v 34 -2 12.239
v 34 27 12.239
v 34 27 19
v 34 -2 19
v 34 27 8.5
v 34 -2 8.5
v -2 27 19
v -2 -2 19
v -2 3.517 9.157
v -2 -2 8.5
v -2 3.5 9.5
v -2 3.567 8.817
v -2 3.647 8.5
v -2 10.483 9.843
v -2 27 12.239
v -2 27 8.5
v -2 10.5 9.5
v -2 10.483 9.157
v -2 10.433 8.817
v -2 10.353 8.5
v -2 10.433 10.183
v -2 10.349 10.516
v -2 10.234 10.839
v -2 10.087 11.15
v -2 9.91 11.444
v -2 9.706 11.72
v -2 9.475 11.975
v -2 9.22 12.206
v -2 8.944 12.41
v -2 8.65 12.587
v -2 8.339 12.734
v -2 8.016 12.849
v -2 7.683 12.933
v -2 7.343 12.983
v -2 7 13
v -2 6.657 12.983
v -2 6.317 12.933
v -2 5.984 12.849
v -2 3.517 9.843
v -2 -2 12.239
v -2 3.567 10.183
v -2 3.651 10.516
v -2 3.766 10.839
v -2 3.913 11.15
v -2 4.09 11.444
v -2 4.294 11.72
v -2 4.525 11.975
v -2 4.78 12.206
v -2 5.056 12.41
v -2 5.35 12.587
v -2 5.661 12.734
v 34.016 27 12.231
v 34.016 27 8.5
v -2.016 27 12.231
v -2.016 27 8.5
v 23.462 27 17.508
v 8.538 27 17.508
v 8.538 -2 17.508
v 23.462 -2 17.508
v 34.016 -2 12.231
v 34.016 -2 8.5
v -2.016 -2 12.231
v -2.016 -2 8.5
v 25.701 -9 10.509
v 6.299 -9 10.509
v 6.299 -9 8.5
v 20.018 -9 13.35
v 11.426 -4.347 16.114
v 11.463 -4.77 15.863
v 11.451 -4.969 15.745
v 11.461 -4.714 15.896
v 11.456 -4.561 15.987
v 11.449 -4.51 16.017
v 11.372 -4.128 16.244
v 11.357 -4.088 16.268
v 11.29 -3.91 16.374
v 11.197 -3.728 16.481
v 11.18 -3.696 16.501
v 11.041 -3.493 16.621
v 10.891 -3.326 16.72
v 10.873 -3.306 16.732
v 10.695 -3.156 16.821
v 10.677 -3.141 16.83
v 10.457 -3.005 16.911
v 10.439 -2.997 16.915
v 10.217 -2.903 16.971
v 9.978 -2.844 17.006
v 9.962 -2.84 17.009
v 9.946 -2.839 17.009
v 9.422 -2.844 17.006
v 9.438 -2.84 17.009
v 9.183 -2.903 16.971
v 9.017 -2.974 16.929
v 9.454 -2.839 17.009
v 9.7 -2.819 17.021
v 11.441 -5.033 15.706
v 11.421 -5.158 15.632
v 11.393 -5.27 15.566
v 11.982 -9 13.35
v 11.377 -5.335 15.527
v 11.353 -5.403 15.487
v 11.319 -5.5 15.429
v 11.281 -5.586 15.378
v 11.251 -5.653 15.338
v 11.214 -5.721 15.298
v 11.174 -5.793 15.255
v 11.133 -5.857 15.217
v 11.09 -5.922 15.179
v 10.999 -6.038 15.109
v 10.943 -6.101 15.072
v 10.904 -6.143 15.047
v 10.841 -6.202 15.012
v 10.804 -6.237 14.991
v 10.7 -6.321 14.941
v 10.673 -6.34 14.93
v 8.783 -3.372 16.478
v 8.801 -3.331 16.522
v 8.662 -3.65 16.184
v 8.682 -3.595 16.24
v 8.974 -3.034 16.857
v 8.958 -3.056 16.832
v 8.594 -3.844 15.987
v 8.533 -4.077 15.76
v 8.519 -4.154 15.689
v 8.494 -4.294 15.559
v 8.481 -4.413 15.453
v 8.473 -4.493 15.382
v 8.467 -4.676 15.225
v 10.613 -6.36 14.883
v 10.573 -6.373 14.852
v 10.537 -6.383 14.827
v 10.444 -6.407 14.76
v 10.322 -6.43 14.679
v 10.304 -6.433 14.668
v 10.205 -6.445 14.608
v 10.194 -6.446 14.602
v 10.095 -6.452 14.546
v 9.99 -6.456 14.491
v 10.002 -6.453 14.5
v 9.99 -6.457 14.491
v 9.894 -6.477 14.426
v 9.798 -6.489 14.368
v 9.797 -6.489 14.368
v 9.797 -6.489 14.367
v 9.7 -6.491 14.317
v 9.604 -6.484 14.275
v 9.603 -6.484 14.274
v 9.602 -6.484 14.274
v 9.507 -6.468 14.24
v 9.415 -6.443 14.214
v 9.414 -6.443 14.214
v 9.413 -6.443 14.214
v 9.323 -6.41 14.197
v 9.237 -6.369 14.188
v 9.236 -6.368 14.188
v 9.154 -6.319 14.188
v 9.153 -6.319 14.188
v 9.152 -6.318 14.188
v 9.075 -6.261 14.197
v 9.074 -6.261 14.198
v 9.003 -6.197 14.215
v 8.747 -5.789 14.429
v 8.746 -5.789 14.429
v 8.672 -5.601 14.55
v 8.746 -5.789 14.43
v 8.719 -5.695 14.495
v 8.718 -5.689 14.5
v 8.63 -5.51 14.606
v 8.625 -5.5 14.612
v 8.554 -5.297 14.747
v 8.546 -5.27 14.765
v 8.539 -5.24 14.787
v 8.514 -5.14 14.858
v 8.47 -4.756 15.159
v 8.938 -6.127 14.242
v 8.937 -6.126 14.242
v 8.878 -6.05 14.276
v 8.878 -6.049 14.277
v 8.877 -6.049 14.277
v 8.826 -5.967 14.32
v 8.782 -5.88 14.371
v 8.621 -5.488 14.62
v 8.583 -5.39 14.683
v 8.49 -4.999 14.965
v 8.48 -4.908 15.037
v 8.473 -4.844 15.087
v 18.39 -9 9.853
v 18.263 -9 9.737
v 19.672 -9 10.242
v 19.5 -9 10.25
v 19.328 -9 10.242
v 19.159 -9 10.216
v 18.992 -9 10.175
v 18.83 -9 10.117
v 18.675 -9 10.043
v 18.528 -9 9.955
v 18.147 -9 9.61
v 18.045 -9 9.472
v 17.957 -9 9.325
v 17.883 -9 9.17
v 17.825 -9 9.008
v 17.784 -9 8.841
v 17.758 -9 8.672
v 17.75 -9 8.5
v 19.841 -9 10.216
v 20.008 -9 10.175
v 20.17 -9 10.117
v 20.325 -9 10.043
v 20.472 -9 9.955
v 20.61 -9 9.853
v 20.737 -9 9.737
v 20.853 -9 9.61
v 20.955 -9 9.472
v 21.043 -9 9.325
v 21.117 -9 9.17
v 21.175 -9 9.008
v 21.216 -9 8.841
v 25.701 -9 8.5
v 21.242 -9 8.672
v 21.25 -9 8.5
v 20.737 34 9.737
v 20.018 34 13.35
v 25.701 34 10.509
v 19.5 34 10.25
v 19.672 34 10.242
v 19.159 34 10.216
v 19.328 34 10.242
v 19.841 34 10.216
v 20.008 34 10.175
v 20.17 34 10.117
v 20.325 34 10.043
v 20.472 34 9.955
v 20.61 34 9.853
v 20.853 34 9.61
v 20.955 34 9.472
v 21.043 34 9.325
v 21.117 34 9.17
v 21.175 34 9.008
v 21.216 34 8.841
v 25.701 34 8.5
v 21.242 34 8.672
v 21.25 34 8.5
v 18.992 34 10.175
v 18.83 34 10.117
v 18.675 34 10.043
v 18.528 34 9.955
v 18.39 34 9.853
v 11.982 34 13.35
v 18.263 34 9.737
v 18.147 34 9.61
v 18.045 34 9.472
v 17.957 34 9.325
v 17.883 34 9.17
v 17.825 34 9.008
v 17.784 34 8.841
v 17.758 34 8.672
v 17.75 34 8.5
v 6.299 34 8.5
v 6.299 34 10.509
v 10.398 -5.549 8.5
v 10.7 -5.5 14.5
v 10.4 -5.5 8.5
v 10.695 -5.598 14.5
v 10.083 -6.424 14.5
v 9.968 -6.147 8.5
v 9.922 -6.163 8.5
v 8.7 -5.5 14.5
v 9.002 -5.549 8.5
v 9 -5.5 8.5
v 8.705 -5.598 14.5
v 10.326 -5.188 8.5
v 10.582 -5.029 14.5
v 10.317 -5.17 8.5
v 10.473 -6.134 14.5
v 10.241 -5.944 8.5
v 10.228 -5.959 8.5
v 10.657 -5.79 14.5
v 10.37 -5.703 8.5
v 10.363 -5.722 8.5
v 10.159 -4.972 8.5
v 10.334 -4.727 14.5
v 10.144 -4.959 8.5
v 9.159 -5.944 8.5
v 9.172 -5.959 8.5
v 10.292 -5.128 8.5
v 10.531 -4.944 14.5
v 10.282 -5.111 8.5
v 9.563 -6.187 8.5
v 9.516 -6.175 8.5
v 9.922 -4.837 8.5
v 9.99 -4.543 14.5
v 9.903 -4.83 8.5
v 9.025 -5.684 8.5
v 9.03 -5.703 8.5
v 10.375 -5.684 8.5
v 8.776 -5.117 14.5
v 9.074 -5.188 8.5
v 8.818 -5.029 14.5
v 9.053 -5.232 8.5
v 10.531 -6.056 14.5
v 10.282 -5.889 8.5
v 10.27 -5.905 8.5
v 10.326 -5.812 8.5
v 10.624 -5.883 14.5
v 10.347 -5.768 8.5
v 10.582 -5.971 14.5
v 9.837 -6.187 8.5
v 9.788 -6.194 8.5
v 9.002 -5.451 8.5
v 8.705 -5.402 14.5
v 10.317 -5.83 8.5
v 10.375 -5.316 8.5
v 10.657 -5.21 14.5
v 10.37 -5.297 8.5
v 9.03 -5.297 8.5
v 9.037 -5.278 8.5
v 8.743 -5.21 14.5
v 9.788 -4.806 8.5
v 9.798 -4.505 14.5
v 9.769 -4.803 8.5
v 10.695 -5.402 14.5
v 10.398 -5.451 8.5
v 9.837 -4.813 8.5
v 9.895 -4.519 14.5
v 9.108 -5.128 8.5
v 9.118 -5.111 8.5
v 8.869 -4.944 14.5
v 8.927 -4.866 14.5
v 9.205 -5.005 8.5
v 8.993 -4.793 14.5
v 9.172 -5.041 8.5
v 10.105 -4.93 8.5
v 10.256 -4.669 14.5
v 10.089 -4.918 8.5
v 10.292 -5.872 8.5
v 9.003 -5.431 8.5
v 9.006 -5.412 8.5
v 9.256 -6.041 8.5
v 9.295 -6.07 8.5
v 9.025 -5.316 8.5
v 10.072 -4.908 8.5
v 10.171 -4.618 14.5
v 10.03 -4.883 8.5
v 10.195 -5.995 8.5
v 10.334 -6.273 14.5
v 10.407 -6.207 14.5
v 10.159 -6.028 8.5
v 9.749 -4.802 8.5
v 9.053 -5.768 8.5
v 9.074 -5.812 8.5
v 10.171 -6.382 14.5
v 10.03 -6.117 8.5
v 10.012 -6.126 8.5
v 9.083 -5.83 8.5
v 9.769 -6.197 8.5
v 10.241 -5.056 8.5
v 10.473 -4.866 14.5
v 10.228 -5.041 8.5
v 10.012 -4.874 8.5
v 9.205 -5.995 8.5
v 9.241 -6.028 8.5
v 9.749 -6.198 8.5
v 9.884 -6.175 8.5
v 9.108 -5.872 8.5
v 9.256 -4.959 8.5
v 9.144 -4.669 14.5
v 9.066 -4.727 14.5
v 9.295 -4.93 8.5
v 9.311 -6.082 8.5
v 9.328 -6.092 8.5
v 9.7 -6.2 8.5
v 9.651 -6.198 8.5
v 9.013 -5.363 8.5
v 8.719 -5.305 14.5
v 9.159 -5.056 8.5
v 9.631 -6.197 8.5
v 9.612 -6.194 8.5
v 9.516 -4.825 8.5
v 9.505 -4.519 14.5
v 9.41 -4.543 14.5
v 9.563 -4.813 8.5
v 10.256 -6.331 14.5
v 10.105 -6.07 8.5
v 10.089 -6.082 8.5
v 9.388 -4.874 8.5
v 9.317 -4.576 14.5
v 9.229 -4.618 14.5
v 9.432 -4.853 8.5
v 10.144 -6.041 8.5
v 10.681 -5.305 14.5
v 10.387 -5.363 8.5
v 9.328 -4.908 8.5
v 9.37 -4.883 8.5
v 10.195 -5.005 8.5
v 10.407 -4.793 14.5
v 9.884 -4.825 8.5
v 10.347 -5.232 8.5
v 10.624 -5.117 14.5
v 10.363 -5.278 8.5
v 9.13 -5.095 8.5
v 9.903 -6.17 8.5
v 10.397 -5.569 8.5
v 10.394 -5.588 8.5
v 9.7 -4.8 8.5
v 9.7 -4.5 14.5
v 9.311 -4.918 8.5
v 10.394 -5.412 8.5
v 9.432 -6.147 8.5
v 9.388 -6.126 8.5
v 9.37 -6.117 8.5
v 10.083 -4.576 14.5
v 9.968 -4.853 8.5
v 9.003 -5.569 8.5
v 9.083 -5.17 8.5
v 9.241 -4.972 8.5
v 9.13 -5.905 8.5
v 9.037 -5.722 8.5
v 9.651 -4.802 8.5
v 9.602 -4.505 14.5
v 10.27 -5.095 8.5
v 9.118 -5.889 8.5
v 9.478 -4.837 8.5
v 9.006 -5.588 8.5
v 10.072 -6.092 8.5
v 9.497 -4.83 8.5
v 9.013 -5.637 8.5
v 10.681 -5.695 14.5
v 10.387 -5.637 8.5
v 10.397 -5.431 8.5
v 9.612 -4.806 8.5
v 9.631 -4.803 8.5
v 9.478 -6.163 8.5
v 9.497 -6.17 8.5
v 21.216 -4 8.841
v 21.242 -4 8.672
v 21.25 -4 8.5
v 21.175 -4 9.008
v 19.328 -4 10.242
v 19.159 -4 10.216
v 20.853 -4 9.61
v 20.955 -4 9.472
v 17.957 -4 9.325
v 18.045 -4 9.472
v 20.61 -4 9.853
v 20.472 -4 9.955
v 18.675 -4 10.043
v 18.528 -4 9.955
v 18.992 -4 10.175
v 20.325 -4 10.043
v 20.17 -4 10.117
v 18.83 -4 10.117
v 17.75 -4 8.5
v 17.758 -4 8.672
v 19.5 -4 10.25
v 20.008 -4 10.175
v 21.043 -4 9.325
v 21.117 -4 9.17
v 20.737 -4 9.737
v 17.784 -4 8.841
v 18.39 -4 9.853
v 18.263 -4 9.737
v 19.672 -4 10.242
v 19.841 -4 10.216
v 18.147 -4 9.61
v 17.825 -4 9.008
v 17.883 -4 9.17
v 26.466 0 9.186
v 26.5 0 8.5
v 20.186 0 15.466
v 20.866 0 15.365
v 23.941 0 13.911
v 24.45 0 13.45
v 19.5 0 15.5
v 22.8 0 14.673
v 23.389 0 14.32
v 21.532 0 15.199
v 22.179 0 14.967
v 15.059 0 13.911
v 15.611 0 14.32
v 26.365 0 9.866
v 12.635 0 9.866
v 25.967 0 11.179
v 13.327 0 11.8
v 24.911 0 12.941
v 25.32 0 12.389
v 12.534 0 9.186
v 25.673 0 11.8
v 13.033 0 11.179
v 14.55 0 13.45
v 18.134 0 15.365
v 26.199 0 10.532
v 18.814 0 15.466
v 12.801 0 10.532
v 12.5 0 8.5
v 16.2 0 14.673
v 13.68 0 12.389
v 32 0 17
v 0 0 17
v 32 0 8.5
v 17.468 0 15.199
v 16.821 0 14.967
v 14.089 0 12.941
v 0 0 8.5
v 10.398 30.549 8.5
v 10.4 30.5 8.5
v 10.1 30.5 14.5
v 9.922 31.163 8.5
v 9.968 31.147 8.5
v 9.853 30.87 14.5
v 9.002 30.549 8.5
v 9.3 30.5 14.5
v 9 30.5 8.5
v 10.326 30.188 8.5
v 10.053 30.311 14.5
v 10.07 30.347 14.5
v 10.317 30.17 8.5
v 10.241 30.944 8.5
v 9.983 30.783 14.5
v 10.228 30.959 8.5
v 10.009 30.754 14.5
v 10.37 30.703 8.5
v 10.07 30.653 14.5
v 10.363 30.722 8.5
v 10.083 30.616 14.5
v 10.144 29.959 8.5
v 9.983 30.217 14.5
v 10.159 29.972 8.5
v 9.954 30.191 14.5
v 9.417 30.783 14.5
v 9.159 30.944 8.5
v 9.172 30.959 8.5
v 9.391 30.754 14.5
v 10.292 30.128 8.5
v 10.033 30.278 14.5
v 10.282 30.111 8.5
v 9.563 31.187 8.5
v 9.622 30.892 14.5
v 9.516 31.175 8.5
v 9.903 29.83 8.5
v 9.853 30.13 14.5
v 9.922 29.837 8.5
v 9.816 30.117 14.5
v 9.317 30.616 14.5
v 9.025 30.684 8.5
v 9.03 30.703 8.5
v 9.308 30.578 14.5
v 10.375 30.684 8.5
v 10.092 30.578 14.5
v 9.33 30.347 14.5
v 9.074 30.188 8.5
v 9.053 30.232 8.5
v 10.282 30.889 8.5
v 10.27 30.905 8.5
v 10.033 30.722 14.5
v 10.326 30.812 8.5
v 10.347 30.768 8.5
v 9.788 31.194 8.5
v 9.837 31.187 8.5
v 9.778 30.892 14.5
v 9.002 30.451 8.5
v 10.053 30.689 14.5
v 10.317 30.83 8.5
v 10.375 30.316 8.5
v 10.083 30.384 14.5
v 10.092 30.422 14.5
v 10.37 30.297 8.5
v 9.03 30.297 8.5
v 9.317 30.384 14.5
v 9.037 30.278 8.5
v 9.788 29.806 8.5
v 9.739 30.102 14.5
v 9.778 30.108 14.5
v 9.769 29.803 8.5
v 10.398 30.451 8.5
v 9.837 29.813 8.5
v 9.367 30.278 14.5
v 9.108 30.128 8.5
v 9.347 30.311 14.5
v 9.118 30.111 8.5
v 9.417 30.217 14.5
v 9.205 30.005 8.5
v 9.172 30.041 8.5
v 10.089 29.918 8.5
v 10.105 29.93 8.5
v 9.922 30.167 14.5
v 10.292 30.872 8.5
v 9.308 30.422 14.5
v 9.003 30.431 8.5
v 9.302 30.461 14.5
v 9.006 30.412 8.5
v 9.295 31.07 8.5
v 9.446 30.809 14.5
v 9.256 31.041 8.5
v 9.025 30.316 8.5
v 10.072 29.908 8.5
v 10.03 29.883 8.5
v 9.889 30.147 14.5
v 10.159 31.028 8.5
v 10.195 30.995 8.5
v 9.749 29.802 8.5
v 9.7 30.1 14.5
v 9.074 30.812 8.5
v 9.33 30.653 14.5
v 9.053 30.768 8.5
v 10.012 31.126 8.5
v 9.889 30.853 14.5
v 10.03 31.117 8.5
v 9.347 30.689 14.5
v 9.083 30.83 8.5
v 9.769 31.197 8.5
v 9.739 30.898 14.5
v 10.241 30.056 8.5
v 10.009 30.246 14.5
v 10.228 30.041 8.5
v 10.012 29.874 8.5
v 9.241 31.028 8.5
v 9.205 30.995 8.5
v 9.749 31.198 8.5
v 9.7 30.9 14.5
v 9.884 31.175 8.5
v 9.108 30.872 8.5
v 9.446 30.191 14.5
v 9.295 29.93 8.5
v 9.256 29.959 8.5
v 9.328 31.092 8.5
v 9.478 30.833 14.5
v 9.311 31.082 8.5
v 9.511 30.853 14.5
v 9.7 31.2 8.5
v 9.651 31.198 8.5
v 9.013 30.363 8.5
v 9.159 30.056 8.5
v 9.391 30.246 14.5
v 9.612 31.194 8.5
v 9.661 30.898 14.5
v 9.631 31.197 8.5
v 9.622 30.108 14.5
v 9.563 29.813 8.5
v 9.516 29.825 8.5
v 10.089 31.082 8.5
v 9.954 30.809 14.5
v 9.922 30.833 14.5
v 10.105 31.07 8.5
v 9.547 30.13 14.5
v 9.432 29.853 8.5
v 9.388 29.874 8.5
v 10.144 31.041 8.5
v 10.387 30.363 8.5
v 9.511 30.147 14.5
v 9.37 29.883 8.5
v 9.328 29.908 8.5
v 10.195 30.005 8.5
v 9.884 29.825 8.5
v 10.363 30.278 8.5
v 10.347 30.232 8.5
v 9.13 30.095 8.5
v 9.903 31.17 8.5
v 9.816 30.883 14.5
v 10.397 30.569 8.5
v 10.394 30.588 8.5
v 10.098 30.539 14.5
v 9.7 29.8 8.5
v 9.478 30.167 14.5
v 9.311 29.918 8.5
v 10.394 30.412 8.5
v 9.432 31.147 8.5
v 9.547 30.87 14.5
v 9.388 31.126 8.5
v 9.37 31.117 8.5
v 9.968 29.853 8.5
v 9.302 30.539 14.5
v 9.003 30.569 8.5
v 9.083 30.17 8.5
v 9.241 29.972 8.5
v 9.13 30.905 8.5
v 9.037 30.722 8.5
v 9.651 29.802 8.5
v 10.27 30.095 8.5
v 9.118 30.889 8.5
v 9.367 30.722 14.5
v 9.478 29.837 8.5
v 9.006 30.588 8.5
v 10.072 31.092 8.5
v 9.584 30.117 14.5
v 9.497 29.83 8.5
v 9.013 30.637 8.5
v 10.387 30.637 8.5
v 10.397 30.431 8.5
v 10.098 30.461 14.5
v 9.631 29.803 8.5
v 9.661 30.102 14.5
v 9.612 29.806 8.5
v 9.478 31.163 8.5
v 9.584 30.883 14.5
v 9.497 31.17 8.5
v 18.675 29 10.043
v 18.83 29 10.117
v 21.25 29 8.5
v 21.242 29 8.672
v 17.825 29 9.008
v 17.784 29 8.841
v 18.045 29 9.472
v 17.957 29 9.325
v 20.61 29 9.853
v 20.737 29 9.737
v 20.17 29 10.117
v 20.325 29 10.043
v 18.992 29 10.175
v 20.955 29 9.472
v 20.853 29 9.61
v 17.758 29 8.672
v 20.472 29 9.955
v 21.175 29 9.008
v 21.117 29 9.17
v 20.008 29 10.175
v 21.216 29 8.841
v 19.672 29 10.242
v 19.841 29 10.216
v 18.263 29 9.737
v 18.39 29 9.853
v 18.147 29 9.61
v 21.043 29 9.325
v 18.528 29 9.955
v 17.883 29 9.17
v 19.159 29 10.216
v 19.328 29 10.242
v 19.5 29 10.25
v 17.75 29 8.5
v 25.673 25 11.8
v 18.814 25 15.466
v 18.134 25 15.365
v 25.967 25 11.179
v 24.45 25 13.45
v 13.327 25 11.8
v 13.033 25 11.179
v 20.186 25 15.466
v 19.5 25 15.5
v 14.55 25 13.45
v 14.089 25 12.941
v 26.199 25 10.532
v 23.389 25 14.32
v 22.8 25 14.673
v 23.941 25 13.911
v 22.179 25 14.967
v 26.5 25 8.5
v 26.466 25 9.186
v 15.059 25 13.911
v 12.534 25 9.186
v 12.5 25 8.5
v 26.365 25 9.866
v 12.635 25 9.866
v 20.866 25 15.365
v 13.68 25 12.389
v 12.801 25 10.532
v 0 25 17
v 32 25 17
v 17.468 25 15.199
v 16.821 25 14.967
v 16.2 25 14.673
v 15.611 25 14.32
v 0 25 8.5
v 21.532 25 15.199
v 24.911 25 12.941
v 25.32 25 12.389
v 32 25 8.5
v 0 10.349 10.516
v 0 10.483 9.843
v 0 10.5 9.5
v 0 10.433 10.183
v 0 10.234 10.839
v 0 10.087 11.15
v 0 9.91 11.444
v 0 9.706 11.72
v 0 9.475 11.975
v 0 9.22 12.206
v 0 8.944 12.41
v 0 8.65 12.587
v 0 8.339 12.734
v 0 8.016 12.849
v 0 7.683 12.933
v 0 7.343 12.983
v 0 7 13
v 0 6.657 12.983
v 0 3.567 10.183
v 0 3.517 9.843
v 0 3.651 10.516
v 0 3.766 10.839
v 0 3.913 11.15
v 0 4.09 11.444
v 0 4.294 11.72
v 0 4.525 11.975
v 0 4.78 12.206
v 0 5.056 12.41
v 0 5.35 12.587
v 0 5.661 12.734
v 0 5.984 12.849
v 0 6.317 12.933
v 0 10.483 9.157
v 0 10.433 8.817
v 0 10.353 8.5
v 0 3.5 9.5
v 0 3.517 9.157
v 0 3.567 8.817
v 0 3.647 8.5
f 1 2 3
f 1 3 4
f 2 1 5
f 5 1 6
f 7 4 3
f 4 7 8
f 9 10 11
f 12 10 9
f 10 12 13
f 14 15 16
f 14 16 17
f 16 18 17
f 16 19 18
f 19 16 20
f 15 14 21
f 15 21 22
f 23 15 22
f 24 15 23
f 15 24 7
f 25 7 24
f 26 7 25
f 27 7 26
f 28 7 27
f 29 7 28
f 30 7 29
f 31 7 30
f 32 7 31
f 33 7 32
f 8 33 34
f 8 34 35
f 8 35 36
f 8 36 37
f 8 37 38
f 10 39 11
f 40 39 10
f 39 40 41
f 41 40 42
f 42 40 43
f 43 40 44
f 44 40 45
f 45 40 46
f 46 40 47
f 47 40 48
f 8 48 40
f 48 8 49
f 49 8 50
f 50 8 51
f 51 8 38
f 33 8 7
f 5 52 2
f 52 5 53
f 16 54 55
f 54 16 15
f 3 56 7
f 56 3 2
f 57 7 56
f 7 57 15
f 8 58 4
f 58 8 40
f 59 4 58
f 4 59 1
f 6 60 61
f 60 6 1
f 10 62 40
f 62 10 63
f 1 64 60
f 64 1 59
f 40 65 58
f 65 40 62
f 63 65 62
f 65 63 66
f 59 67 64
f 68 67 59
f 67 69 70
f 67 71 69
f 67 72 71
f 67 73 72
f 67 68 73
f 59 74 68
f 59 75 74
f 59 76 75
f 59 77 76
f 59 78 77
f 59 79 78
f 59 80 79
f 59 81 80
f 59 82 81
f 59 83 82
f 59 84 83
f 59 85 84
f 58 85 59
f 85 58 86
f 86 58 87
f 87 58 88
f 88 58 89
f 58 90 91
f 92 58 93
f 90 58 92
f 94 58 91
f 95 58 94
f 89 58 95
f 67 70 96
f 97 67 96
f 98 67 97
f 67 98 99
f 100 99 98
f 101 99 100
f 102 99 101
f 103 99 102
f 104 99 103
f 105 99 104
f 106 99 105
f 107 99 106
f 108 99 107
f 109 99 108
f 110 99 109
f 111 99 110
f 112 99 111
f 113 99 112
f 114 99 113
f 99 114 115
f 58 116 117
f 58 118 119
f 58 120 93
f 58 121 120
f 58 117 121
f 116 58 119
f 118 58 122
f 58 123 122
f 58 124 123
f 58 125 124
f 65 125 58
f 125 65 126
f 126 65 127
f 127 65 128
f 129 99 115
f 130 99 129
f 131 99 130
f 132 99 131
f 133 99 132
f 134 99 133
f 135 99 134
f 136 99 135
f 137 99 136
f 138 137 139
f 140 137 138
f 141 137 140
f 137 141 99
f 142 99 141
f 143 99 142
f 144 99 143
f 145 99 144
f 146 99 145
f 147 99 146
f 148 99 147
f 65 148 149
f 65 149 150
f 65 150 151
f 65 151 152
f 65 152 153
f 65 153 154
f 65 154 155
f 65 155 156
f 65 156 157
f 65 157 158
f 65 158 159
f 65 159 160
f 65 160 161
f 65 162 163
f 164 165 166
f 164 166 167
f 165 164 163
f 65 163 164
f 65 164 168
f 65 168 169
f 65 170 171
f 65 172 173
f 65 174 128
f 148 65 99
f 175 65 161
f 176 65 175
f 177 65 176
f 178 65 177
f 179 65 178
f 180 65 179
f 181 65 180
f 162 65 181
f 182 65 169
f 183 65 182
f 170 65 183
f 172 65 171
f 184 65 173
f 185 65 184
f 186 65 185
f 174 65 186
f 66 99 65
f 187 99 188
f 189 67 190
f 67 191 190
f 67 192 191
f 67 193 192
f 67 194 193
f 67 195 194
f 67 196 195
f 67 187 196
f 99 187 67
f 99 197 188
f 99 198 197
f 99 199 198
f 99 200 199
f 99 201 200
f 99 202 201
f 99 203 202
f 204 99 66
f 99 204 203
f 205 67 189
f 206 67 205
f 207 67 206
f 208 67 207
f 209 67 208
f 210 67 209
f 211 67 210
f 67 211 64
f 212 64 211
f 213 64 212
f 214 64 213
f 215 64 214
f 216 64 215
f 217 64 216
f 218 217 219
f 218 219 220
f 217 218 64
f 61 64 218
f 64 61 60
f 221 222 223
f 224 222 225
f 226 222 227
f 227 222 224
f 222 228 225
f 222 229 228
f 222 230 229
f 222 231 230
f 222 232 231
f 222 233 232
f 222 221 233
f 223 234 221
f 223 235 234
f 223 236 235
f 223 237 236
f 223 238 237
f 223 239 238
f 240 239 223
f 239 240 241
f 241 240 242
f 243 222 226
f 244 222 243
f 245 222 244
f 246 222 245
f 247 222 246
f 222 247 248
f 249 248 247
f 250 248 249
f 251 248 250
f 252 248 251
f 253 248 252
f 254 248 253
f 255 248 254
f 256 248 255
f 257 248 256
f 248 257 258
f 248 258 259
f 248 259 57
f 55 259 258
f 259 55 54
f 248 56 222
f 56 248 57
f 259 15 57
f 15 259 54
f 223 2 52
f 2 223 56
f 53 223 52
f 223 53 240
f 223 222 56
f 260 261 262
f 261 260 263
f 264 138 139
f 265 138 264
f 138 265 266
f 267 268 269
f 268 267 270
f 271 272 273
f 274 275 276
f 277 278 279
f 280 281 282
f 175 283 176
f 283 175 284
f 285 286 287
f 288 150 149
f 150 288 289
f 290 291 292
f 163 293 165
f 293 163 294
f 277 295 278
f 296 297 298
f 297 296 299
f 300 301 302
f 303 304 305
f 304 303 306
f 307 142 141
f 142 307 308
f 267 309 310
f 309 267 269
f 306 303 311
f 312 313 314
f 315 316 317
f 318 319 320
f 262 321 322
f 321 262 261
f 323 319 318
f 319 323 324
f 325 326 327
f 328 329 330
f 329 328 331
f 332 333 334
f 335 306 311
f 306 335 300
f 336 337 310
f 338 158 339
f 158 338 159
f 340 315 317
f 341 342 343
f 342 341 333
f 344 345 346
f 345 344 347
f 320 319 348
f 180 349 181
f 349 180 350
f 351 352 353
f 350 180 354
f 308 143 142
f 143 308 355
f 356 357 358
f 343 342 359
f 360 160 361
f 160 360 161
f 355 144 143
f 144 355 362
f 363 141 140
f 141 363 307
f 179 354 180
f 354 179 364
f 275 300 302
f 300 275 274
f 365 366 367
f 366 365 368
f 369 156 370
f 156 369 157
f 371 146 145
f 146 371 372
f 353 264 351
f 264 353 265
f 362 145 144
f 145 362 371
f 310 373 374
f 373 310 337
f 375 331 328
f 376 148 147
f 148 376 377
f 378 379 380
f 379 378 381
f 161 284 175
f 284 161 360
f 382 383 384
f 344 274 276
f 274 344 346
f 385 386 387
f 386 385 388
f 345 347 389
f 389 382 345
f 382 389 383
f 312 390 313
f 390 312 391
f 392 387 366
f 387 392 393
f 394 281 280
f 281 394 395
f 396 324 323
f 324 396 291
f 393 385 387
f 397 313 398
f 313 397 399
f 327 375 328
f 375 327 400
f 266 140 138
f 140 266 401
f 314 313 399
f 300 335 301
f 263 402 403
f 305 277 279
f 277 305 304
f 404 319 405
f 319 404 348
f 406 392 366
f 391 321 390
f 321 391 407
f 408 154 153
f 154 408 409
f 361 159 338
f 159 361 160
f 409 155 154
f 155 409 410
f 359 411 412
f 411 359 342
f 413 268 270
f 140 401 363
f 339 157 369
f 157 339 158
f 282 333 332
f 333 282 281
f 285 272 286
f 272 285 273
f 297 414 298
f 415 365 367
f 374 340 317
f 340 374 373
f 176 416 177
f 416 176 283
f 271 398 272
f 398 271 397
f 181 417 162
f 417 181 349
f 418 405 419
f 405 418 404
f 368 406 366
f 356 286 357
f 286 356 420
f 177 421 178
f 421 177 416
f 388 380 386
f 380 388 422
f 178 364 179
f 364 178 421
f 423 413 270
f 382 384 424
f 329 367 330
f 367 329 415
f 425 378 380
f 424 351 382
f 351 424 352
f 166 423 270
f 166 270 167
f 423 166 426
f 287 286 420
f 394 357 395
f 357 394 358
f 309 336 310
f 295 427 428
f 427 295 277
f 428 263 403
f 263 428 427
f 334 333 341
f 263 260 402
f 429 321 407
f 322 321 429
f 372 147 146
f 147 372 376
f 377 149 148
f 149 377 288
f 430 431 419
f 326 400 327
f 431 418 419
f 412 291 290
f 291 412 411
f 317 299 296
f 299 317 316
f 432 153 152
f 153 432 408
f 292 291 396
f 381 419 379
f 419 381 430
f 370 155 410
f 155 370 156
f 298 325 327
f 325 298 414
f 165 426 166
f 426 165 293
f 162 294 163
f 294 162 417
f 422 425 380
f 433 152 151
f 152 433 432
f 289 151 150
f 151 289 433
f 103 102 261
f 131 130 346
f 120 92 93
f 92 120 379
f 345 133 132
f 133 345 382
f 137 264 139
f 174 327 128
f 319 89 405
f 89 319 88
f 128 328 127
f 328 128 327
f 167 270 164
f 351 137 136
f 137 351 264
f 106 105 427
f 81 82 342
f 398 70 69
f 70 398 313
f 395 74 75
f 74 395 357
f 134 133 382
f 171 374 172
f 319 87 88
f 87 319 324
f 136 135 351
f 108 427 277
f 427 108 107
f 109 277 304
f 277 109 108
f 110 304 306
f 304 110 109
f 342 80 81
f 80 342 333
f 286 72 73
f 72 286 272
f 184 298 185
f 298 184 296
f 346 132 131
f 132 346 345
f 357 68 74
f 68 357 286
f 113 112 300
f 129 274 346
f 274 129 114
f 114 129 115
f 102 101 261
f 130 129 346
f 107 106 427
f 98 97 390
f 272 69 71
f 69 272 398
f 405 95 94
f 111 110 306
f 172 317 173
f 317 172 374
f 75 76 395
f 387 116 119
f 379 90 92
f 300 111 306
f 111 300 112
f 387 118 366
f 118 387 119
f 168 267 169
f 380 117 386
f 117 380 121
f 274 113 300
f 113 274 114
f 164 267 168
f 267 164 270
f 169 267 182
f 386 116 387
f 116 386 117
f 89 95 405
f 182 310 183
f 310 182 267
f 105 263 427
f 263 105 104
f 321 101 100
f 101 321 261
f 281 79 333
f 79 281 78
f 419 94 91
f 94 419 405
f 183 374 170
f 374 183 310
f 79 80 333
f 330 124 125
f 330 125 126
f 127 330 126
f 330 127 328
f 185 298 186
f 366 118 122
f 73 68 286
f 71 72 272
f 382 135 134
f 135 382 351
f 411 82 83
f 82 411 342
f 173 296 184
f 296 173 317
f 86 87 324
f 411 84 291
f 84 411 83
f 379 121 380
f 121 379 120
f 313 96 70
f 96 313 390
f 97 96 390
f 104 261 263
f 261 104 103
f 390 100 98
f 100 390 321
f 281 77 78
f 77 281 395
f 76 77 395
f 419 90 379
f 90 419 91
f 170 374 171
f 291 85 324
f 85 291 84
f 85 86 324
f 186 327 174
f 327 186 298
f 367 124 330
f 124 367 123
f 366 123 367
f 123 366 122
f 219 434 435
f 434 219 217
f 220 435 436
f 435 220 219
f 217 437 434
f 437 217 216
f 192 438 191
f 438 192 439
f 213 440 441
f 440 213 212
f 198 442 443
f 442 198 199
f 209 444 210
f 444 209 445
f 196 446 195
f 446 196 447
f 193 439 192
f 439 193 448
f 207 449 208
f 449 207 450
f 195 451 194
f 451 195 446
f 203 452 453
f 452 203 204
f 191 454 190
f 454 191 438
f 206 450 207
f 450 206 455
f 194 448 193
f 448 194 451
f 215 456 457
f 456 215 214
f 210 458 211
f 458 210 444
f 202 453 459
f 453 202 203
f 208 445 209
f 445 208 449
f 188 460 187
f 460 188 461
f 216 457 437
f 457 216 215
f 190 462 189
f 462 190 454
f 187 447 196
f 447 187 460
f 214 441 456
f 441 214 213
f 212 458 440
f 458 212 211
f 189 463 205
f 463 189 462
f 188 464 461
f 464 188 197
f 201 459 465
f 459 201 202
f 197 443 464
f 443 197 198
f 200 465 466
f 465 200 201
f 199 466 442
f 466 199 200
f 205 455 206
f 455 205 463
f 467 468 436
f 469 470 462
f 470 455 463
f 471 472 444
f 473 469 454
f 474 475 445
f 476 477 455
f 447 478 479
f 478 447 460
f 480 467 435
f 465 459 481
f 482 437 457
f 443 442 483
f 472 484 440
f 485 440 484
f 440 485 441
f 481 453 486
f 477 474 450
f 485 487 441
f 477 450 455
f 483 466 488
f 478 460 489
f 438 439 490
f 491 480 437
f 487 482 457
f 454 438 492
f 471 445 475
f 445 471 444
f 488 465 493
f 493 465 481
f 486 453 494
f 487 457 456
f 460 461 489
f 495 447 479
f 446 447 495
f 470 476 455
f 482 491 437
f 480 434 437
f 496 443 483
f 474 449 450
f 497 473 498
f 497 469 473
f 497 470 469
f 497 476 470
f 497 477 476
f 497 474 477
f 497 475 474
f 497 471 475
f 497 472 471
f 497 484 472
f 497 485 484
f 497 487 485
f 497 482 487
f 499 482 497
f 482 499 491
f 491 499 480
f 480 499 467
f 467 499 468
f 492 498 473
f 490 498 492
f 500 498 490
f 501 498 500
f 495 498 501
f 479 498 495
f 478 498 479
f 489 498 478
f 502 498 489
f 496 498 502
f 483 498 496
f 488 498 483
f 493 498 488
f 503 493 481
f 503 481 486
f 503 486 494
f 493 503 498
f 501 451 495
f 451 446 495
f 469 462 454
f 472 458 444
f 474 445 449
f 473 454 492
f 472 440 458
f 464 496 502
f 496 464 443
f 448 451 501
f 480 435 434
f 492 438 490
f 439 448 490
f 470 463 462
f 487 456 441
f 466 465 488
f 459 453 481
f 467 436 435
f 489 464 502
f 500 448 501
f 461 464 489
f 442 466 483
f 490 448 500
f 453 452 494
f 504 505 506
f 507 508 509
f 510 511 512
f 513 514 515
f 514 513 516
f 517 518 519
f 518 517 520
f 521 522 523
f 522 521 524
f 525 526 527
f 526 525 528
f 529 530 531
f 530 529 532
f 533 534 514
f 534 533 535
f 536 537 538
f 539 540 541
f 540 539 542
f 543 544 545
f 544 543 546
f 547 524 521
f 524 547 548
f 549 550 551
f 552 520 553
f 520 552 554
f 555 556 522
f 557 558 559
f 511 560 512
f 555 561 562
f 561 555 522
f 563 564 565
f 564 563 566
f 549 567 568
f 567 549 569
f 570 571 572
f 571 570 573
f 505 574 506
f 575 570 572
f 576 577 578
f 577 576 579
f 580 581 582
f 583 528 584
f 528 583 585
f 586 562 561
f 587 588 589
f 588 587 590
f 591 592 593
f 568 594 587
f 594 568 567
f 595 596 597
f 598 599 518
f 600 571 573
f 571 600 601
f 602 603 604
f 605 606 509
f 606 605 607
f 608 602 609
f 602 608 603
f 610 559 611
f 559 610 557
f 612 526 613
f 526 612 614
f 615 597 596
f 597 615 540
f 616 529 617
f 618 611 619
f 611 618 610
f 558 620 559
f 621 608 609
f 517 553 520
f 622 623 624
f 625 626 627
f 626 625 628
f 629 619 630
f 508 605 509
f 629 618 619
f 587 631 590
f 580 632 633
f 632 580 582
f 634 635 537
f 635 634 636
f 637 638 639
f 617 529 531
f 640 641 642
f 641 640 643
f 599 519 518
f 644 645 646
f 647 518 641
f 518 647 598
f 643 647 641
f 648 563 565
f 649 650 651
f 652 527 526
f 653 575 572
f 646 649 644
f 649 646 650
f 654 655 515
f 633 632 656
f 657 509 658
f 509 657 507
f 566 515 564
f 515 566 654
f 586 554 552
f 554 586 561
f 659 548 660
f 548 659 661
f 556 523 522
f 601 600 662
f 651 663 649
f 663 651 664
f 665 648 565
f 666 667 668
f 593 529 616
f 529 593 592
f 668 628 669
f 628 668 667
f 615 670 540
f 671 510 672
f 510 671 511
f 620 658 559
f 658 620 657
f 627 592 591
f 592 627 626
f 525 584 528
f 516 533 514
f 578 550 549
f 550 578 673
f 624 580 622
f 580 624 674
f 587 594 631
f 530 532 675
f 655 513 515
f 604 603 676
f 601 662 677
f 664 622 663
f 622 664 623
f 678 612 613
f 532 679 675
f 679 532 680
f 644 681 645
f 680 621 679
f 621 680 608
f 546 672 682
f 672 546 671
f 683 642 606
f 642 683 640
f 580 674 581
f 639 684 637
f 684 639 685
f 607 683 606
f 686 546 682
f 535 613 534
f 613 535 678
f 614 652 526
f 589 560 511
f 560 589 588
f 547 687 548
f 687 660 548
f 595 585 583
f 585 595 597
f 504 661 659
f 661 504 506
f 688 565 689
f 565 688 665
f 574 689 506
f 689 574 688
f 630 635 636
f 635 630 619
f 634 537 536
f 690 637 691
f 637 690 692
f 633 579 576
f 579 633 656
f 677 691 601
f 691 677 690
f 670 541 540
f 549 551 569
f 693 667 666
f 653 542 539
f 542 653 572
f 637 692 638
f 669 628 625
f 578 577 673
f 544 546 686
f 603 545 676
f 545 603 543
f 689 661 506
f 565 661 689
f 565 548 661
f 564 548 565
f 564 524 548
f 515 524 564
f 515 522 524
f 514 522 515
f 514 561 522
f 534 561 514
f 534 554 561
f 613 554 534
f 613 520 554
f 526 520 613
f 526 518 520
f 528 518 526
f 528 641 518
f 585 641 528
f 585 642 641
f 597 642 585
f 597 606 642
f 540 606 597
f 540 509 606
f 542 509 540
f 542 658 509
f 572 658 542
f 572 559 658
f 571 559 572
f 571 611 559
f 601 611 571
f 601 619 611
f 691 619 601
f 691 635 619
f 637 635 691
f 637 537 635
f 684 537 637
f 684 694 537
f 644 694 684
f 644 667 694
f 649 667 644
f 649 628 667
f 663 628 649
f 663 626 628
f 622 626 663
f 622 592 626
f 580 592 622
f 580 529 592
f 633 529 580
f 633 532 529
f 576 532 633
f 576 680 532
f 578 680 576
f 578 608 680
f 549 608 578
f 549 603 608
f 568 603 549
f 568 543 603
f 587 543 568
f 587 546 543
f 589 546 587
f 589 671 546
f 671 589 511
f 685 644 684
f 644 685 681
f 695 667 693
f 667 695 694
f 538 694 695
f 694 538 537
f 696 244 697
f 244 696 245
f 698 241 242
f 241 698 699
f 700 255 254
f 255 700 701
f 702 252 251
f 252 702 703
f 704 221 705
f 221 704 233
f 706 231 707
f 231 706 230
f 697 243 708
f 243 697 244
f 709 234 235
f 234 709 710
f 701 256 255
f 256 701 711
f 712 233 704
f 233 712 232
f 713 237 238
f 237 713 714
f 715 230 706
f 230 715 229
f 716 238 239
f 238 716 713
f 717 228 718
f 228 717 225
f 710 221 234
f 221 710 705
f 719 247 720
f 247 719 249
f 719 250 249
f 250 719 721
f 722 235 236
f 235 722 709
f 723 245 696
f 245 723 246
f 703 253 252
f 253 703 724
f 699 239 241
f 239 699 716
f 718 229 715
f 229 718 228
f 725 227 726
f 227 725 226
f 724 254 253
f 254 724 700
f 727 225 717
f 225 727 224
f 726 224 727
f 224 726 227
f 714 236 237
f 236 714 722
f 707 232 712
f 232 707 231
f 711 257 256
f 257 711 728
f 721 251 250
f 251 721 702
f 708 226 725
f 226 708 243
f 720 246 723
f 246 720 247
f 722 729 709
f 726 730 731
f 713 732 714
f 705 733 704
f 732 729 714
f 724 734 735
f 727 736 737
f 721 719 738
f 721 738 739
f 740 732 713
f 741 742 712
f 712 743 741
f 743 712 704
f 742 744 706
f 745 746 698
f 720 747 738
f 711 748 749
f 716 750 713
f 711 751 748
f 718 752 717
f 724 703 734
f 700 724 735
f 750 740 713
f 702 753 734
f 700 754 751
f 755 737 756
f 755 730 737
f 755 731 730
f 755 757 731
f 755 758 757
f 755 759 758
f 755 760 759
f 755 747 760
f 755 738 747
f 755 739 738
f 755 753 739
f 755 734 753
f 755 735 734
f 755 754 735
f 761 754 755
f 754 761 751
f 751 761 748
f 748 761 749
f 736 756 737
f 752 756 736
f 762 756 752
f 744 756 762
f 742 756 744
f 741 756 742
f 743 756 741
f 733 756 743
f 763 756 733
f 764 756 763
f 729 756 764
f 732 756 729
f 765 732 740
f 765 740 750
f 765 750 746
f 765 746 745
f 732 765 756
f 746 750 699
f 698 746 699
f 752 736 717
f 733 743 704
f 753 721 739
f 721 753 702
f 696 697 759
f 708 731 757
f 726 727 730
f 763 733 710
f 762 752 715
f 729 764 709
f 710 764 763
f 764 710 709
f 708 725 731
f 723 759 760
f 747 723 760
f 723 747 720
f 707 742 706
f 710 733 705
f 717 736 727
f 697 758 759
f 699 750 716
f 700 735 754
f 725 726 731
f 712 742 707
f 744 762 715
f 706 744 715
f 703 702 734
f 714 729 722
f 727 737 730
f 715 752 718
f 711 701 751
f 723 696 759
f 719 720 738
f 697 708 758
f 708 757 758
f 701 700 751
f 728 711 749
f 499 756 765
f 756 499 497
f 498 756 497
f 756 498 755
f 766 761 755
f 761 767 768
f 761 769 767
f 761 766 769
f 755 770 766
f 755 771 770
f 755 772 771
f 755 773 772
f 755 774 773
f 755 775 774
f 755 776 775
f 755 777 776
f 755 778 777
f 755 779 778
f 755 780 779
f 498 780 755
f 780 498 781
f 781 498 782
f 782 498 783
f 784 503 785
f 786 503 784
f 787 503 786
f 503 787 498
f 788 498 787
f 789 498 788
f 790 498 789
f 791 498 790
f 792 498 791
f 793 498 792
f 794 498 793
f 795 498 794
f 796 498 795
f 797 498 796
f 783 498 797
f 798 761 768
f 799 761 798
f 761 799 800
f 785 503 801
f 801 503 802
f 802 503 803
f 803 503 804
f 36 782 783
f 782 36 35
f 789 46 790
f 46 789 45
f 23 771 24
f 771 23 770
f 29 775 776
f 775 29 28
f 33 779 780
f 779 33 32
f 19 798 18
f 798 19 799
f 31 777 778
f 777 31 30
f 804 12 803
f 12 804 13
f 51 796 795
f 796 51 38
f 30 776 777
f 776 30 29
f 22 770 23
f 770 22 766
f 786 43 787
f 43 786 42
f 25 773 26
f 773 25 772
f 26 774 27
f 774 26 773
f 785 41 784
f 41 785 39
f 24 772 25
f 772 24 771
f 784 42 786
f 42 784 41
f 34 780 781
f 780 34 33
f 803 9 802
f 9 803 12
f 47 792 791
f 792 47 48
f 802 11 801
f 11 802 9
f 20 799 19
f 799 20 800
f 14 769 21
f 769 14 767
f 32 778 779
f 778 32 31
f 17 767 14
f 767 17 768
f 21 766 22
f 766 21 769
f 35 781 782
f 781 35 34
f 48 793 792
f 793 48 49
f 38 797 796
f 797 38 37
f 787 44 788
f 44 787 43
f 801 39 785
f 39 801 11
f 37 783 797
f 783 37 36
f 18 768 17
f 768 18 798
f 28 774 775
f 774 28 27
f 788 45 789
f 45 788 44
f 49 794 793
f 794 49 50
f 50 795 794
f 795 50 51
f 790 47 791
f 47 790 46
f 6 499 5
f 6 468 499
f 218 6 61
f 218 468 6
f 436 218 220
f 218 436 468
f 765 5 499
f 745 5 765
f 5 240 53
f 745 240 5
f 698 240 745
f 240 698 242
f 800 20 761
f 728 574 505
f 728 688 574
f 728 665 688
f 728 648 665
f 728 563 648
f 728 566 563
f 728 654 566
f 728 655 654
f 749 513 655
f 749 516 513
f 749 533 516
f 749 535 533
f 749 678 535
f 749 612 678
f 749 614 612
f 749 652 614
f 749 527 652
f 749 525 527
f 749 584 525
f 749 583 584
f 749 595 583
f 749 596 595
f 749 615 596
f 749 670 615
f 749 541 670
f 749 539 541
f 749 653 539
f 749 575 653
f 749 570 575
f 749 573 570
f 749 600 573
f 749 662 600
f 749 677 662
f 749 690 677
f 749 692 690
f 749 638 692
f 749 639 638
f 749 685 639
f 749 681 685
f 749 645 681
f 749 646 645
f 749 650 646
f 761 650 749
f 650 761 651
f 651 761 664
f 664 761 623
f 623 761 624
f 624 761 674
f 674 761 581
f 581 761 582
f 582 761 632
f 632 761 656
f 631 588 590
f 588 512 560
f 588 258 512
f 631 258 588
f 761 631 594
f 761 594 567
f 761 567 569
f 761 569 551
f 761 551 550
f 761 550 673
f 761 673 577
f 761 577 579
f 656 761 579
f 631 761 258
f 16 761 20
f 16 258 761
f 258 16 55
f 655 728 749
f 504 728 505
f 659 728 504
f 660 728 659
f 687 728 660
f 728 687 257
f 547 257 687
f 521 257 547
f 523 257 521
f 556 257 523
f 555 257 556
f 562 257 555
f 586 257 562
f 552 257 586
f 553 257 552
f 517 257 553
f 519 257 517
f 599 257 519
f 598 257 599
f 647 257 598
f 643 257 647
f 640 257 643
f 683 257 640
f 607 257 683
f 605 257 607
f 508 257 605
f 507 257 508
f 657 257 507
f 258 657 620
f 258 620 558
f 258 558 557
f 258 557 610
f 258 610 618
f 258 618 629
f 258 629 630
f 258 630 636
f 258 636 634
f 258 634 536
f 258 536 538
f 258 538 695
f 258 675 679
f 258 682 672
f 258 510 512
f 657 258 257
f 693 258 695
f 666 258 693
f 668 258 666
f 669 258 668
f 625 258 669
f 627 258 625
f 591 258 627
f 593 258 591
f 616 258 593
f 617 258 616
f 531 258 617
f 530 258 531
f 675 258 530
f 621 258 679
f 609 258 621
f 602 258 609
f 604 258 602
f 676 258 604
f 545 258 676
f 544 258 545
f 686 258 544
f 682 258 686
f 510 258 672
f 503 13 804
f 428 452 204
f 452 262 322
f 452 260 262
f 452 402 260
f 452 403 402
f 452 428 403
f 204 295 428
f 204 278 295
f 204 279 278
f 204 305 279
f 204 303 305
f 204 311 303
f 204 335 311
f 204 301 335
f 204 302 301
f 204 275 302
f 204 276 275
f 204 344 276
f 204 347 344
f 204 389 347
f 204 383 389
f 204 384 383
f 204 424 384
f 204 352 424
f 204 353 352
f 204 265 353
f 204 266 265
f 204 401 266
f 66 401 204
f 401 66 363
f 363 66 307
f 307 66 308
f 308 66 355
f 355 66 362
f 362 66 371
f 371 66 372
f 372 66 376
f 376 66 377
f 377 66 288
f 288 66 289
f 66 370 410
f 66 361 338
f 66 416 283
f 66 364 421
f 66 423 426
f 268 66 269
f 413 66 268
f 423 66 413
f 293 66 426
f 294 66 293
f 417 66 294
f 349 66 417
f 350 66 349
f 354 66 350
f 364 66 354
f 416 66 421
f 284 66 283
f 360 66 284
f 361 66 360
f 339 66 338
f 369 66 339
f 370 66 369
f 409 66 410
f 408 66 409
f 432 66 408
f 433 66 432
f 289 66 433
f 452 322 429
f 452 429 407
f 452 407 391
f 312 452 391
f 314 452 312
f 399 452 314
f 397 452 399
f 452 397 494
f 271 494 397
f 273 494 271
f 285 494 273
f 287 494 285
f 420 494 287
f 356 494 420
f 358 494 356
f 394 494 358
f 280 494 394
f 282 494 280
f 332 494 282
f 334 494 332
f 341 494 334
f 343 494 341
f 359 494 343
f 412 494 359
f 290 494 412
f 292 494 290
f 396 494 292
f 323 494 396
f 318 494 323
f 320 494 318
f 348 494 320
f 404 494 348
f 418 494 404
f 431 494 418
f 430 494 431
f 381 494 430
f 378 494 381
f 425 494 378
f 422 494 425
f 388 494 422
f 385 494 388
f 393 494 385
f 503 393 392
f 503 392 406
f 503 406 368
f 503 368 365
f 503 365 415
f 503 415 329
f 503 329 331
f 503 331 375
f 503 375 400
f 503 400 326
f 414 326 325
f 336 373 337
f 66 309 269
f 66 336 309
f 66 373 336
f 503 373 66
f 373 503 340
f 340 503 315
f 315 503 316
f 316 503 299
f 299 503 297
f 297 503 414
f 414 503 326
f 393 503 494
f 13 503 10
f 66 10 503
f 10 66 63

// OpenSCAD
/*
       ________________
 _____|         ___    |
|_____|        | | |   |
      |        | | |   |
      |________|_|_|___|

*/
height = 17;
width = 32;
depth = 25;

pin_h=2.5;

thickness = 2;

twist_d = 7;
twist_y=7;
twist_z=7;
real_twist_z=twist_z+pin_h;

cable_width=3.5;


//getOnlyBottom();
getOnlyTop();




cable_enter_h_accurately=-1.5;//3.3;
cable_enter_h=height+thickness*2+cable_enter_h_accurately;
cable_enter_w=7;
screw_h=12;

module cable_enter_shell(){
    scale([2,1,1]) rotate(22.5,0,0) cylinder(h = 7, d1=cable_enter_h,d2=cable_width*3, $fn=8);
}

module cable_enter_holes(){
    translate([cable_width,0,0]) cylinder(h = cable_enter_w, d=cable_width, $fn=64);
    translate([-cable_width*1.8,screw_h/2,cable_enter_w/2]) rotate([90,0,0]) union(){
        cylinder(h = screw_h, d1=2 ,d2=0.8, $fn=64);
        translate([0,0,-3]) cylinder(h = 3, d1=6,d2=2 , $fn=64);
    }
    translate([cable_width,0,-2]) cylinder(h = 4, d1=cable_width*4,d2=cable_width, $fn=64);
}

module cable_enter_complete(){
    difference(){
    cable_enter_shell();
    cable_enter_holes();
    }
}

module getComplete(){
difference(){
    union(){
        translate([-thickness,-thickness,-thickness]) cube([width+thickness*2,depth+thickness*2,height+thickness*2]);
        translate([width/2,-thickness,-thickness+cable_enter_h/2-cable_enter_h_accurately/2]) rotate([90,0,0]) cable_enter_shell();
        translate([width/2,depth+thickness,-thickness+cable_enter_h/2-cable_enter_h_accurately/2]) rotate([-90,0,0]) cable_enter_shell();
    }
    
    union(){
        cube([width,depth,height]);
        translate([-thickness,twist_y,real_twist_z]) rotate([0,90,0]) cylinder(d=twist_d, h=10, $fn=64);
        translate([width/2,-thickness,-thickness+cable_enter_h/2-cable_enter_h_accurately/2]) rotate([90,0,0]) cable_enter_holes();
                translate([width/2,depth+thickness,-thickness+cable_enter_h/2-cable_enter_h_accurately/2]) rotate([-90,0,0]) cable_enter_holes();
    }
}
}


module getOnlyTop(){
    difference(){
        getComplete();
        getSliceCube();
    }
}

module getOnlyBottom(){
    intersection(){
        getComplete();
        getSliceCube();
    }
}

module getSliceCube(){
    translate([0,0,0])cube([100,100,height], center=true);
}
